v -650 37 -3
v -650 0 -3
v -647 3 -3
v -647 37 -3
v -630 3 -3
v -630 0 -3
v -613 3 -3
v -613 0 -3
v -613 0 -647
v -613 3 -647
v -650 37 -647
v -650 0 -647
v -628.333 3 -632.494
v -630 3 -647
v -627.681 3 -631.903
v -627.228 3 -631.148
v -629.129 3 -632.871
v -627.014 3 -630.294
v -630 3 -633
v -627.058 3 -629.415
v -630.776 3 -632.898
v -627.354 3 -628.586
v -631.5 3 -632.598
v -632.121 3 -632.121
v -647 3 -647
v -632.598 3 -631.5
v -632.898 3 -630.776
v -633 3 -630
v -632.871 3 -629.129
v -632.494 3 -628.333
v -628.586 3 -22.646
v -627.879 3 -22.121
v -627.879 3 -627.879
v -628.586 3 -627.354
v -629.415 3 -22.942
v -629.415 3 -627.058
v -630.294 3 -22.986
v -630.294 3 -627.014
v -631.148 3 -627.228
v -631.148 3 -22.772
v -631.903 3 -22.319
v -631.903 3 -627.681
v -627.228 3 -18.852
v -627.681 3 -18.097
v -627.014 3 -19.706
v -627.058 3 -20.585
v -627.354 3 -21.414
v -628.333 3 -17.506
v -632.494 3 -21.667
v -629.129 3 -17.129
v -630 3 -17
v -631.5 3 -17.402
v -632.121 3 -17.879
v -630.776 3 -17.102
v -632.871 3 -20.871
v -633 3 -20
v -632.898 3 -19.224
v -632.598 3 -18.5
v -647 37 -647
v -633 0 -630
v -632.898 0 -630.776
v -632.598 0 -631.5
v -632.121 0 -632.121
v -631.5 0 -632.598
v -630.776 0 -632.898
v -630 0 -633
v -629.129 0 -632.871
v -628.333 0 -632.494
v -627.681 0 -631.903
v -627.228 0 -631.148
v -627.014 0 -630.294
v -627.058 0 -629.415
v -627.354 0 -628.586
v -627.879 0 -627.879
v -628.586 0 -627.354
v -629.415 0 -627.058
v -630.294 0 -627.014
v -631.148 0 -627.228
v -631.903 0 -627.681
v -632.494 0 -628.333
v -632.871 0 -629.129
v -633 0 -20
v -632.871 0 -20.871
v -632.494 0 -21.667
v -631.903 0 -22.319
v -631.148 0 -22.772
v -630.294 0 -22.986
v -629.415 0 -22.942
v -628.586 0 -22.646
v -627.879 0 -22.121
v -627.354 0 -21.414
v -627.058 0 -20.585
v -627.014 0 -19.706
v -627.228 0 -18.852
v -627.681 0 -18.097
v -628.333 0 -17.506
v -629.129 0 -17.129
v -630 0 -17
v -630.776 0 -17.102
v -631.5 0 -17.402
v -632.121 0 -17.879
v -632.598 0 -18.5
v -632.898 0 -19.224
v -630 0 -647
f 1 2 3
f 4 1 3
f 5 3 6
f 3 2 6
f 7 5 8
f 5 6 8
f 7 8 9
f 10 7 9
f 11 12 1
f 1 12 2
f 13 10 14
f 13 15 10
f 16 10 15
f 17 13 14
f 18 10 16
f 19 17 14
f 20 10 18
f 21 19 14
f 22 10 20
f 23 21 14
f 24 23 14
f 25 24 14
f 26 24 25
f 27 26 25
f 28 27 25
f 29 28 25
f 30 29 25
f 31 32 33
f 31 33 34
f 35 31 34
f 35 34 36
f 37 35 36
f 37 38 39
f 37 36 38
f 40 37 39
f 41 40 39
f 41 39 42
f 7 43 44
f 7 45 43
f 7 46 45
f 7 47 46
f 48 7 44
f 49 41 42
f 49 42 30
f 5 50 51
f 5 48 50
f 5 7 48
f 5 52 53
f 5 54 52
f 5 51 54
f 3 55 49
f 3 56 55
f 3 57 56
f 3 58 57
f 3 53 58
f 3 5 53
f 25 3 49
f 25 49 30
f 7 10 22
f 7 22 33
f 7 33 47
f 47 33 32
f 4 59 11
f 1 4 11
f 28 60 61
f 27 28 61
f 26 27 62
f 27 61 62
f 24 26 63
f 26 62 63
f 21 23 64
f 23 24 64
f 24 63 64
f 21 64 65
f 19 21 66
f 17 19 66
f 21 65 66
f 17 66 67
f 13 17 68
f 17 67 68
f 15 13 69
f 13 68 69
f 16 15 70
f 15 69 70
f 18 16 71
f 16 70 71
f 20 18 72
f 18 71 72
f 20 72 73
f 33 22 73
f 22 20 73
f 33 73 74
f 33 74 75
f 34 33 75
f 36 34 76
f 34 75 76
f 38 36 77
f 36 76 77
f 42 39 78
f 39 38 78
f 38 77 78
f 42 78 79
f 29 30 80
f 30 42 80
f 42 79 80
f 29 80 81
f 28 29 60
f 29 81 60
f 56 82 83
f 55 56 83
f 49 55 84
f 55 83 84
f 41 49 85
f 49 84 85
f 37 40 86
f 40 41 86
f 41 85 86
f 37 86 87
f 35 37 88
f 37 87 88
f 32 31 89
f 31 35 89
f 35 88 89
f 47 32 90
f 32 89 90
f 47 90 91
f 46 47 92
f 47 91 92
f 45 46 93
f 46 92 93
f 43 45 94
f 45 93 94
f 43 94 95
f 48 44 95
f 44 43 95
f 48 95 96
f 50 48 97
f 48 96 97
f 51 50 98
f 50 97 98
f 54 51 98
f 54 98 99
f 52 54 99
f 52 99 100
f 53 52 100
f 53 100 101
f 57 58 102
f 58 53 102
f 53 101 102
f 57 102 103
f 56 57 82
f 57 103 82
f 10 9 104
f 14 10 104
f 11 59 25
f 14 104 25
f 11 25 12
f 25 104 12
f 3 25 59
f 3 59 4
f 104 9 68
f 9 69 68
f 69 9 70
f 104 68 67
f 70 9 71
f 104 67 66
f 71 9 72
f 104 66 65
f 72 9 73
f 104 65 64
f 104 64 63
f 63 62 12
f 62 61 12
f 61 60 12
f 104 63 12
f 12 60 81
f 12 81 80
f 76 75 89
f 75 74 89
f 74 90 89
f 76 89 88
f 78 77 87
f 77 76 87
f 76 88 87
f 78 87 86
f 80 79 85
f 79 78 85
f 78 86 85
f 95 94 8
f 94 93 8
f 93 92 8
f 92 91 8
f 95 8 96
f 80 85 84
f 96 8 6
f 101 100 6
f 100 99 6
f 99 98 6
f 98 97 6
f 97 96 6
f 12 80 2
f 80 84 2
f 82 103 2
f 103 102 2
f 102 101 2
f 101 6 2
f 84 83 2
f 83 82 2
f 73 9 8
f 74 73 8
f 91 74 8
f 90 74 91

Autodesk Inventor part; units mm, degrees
ref_plane "YZ Plane" through (0, 0, 0) normal (1, 0, 0) x (0, 1, 0)
ref_plane "XZ Plane" through (0, 0, 0) normal (0, 1, 0) x (-1, 0, 0)
ref_plane "XY Plane" through (0, 0, 0) normal (0, 0, 1) x (1, 0, 0)
sketch "Sketch1" plane through (0, 0, 0) normal (0, 1, 0) x (-1, 0, 0)
  line L0 (0, 0) -> (0, -650)
  line L1 (0, -650) -> (650, -650)
  line L2 (650, -647) -> (650, -3)
  line L3 (650, 0) -> (0, 0)
  line L4 (0, 0) -> (3, 0)
  line L5 (3, -3) -> (3, -647)
  line L6 (3, -650) -> (0, -650)
  line L7 (0, -650) -> (0, -647)
  line L8 (650, -647) -> (650, -650)
  line L9 (650, -650) -> (647, -650)
  line L10 (647, -647) -> (647, -3)
  line L11 (647, 0) -> (650, 0)
  line L12 (650, 0) -> (650, -3)
  line L13 (0, -3) -> (0, 0)
  line L14 (0, 0) -> (0, -37)
  line L15 (650, -37) -> (650, 0)
  line L16 (650, 0) -> (613, 0)
  line L17 (613, -3) -> (613, -647)
  line L18 (613, -650) -> (650, -650)
  line L19 (650, -650) -> (650, -613)
  line L20 (0, -613) -> (0, -650)
  line L21 (0, -650) -> (37, -650)
  line L22 (37, 0) -> (0, 0)
  line L23 (3, -147.3087) -> (3, -94.9828)
  line L24 (147.3087, -3) -> (94.9828, -3)
  circle A0 centre (16.1109, -108.0348) radius 3
  line L25 (0, -650) -> (3, -650)
  line L26 (0, -647) -> (0, -650)
  line L27 (0, -650) -> (0, -613)
  line L28 (37, -650) -> (0, -650)
  line L29 (3, -502.6913) -> (3, -555.0172)
  line L30 (147.3087, -647) -> (94.9828, -647)
  circle A1 centre (16.1109, -541.9652) radius 3
  line L31 (37, -650) -> (37, -37)
  line L32 (37, -3) -> (37, 0)
  line L33 (650, -3) -> (34.9546, -3)
  line L34 (34.9546, -647) -> (650, -647)
  line L35 (37, -37) -> (0, 0)
  line L36 (37, -613) -> (0, -650)
  line L37 (0, -650) -> (3, -647)
  line L38 (3, -647) -> (3, -3)
  line L39 (3, -3) -> (0, 0)
  line L40 (3, -325) -> (3, -458)
  line L41 (3, -458) -> (20, -458)
  line L42 (3, -325) -> (3, -192)
  line L43 (3, -192) -> (20, -192)
  circle A2 centre (20, -192) radius 3
  circle A3 centre (20, -458) radius 3
  line L44 (647, -3) -> (630, -3)
  line L45 (630, -3) -> (630, -20)
  line L46 (647, -647) -> (630, -647)
  line L47 (630, -647) -> (630, -630)
  circle A4 centre (630, -630) radius 3
  circle A5 centre (630, -20) radius 3
  point P0 (37, -647)
  dimension "d0" = 650
  dimension "d1" = 650
  dimension "d2" = 650
  dimension "d3" = 3
  dimension "d4" = 650
  dimension "d5" = 3
  dimension "d6" = 3
  dimension "d7" = 650
  dimension "d8" = 3
  dimension "d9" = 650
  dimension "d10" = 37
  dimension "d12" = 37
  dimension "d13" = 650
  dimension "d14" = 37
  dimension "d15" = 650
  dimension "d16" = 37
  dimension "d28" = 6
  dimension "d33" = 133
  dimension "d34" = 17
  dimension "d35" = 133
  dimension "d36" = 17
  dimension "d37" = 6
  dimension "d38" = 6
  dimension "d41" = 17
  dimension "d42" = 17
  dimension "d43" = 17
  dimension "d44" = 17
  dimension "d45" = 6
  dimension "d46" = 6
extrude "Extrusion4" add sketch "Sketch1" along normal blind 3 contours L33 L10 L34 L17
extrude "Extrusion5" add sketch "Sketch1" along normal blind 37 contours L2 L34 L10 L33
properties part number "body_inner_center_bar"
